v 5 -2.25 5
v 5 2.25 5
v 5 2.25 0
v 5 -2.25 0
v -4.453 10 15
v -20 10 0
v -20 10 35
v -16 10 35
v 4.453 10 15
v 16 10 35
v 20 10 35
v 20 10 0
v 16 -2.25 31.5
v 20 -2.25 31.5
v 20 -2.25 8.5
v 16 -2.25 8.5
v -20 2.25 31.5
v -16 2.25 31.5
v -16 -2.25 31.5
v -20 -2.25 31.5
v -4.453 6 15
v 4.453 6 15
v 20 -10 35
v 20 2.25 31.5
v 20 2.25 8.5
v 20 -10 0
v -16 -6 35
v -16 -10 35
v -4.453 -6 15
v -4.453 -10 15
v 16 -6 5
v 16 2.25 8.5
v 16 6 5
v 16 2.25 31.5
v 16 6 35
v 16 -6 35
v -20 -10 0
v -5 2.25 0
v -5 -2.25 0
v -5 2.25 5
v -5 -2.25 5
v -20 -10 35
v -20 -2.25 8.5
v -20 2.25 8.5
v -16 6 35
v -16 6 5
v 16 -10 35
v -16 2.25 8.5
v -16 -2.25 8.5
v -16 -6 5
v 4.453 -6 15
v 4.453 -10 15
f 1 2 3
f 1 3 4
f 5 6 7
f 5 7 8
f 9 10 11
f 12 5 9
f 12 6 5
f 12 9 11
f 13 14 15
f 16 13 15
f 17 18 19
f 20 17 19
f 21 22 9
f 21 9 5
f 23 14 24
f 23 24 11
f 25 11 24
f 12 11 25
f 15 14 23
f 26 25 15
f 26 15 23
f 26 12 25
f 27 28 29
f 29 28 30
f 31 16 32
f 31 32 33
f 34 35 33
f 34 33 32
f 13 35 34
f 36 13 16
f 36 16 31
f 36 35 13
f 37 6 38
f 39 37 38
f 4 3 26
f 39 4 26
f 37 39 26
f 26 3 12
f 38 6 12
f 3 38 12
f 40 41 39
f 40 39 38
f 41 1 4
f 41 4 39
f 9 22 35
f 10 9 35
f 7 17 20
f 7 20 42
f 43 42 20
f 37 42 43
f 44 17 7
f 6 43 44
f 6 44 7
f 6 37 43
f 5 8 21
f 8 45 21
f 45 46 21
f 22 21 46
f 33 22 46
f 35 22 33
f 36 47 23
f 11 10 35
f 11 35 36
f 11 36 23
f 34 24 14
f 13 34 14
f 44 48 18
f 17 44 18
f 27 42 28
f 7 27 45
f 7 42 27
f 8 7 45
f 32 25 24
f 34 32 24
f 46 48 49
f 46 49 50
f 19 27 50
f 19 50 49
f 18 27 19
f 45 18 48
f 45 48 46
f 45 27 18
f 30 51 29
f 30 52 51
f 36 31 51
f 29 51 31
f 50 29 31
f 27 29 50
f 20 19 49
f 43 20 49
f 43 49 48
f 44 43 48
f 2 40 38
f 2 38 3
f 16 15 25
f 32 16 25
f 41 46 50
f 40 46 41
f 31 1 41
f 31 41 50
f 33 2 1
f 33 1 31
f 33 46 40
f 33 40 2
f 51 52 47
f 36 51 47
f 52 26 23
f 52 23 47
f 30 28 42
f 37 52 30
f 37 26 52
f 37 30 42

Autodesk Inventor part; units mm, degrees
ref_plane "YZ Plane" through (0, 0, 0) normal (1, 0, 0) x (0, 1, 0)
ref_plane "XZ Plane" through (0, 0, 0) normal (0, 1, 0) x (-1, 0, 0)
ref_plane "XY Plane" through (0, 0, 0) normal (0, 0, 1) x (1, 0, 0)
sketch "Náčrt1" plane through (0, 0, 0) normal (0, 0, 1) x (1, 0, 0)
  line L0 (0, 14) -> (0, -14) projected
  line L1 (-28, 0) -> (28, 0) projected
  line L2 (20, -10) -> (-20, -10)
  line L3 (-20, -10) -> (-20, 10)
  line L4 (-20, 10) -> (20, 10)
  line L5 (20, 10) -> (20, -10)
  point P0 (0, 0)
  dimension "d0" = 40
  dimension "d1" = 20
extrude "Vysunutí1" add sketch "Náčrt1" along normal blind 35
sketch "Náčrt2" plane through (0, 0, 35) normal (0, 0, 1) x (1, 0, 0)
  line L0 (20, 10) -> (-20, 10) projected
  line L1 (-20, 10) -> (-20, -10) projected
  line L2 (-20, -10) -> (20, -10) projected
  line L3 (20, -10) -> (20, 10) projected
  line L4 (-16, 6) -> (16, 6)
  line L5 (16, 6) -> (16, -6)
  line L6 (16, -6) -> (-16, -6)
  line L7 (-16, -6) -> (-16, 6)
  point P0 (0, 0)
  dimension "d4" = 4
extrude "Vysunutí2" cut sketch "Náčrt2" against normal blind 30 contours L4 L5 L6 L7
sketch "Náčrt3" plane through (0, 0, 5) normal (0, 0, 1) x (1, 0, 0)
  line L0 (16, -6) -> (-16, -6) projected
  line L1 (16, 6) -> (16, -6) projected
  line L2 (-16, 6) -> (16, 6) projected
  line L3 (-16, -6) -> (-16, 6) projected
  line L4 (0, 14) -> (0, -14) projected
  line L5 (-28, 0) -> (28, 0) projected
  line L6 (-5, 2.25) -> (5, 2.25)
  line L7 (5, 2.25) -> (5, -2.25)
  line L8 (5, -2.25) -> (-5, -2.25)
  line L9 (-5, -2.25) -> (-5, 2.25)
  point P0 (0, 0)
  dimension "d7" = 10
  dimension "d8" = 4.5
extrude "Vysunutí3" cut sketch "Náčrt3" against normal through all contours L8 L9 L5 L4 | L4 L5 L7 L8 | L5 L4 L6 L7 | L5 L9 L6 L4
sketch "Náčrt4" plane through (20, -10, 0) normal (1, 0, 0) x (0, 0, -1)
  line L0 (0, 0) -> (0, 20) projected
  line L1 (0, 20) -> (-35, 20) projected
  line L2 (-35, 0) -> (-35, 20) projected
  line L3 (0, 0) -> (-35, 0) projected
  line L4 (-42, 10) -> (7, 10) projected
  line L5 (0, -6) -> (0, 36) projected
  line L6 (-35, 16) -> (-5, 16) projected
  line L7 (-35, 4) -> (-5, 4) projected
  line L8 (-5, 16) -> (-5, 4) projected
  line L9 (-31.5, 7.75) -> (-8.5, 7.75)
  line L10 (-8.5, 7.75) -> (-8.5, 12.25)
  line L11 (-8.5, 12.25) -> (-31.5, 12.25)
  line L12 (-31.5, 12.25) -> (-31.5, 7.75)
  line L13 (-31.5, 10) -> (-8.5, 10)
  line L14 (-8.5, 10) -> (-8.5, 7.75)
  line L15 (-8.5, 7.75) -> (-31.5, 7.75)
  line L16 (-31.5, 7.75) -> (-31.5, 10)
  point P0 (0, 10)
  dimension "d11" = 4.5
  dimension "d12" = 23
  dimension "d13" = 3.5
extrude "Vysunutí4" cut sketch "Náčrt4" against normal through all contours L10 L9 L12 L4 | L4 L12 L11 L10
sketch "Náčrt5" plane through (-20, -10, 0) normal (0, -1, 0) x (1, 0, 0)
  line L0 (0, 0) -> (40, 0) projected
  line L1 (40, 0) -> (40, 35) projected
  line L2 (0, 35) -> (40, 35) projected
  line L3 (0, 0) -> (0, 35) projected
  line L4 (20, 42) -> (20, -7) projected
  line L5 (-8, 0) -> (48, 0) projected
  line L6 (4, 35) -> (4, 5) projected
  line L7 (36, 35) -> (36, 5) projected
  line L8 (4, 35) -> (15.547, 15)
  line L9 (24.453, 15) -> (36, 35)
  line L10 (24.453, 15) -> (15.547, 15)
  line L11 (36, 5) -> (4, 5) projected
  line L12 (4, 35) -> (36, 35)
  point P0 (20, 0)
  dimension "d16" = 30
  dimension "d17" = 30
  dimension "d18" = 10
extrude "Vysunutí5" cut sketch "Náčrt5" against normal through all contours L2 L4 L10 L8 | L4 L2 L9 L10
properties part number "uhelnik_30x30_M4_3D tisk"
